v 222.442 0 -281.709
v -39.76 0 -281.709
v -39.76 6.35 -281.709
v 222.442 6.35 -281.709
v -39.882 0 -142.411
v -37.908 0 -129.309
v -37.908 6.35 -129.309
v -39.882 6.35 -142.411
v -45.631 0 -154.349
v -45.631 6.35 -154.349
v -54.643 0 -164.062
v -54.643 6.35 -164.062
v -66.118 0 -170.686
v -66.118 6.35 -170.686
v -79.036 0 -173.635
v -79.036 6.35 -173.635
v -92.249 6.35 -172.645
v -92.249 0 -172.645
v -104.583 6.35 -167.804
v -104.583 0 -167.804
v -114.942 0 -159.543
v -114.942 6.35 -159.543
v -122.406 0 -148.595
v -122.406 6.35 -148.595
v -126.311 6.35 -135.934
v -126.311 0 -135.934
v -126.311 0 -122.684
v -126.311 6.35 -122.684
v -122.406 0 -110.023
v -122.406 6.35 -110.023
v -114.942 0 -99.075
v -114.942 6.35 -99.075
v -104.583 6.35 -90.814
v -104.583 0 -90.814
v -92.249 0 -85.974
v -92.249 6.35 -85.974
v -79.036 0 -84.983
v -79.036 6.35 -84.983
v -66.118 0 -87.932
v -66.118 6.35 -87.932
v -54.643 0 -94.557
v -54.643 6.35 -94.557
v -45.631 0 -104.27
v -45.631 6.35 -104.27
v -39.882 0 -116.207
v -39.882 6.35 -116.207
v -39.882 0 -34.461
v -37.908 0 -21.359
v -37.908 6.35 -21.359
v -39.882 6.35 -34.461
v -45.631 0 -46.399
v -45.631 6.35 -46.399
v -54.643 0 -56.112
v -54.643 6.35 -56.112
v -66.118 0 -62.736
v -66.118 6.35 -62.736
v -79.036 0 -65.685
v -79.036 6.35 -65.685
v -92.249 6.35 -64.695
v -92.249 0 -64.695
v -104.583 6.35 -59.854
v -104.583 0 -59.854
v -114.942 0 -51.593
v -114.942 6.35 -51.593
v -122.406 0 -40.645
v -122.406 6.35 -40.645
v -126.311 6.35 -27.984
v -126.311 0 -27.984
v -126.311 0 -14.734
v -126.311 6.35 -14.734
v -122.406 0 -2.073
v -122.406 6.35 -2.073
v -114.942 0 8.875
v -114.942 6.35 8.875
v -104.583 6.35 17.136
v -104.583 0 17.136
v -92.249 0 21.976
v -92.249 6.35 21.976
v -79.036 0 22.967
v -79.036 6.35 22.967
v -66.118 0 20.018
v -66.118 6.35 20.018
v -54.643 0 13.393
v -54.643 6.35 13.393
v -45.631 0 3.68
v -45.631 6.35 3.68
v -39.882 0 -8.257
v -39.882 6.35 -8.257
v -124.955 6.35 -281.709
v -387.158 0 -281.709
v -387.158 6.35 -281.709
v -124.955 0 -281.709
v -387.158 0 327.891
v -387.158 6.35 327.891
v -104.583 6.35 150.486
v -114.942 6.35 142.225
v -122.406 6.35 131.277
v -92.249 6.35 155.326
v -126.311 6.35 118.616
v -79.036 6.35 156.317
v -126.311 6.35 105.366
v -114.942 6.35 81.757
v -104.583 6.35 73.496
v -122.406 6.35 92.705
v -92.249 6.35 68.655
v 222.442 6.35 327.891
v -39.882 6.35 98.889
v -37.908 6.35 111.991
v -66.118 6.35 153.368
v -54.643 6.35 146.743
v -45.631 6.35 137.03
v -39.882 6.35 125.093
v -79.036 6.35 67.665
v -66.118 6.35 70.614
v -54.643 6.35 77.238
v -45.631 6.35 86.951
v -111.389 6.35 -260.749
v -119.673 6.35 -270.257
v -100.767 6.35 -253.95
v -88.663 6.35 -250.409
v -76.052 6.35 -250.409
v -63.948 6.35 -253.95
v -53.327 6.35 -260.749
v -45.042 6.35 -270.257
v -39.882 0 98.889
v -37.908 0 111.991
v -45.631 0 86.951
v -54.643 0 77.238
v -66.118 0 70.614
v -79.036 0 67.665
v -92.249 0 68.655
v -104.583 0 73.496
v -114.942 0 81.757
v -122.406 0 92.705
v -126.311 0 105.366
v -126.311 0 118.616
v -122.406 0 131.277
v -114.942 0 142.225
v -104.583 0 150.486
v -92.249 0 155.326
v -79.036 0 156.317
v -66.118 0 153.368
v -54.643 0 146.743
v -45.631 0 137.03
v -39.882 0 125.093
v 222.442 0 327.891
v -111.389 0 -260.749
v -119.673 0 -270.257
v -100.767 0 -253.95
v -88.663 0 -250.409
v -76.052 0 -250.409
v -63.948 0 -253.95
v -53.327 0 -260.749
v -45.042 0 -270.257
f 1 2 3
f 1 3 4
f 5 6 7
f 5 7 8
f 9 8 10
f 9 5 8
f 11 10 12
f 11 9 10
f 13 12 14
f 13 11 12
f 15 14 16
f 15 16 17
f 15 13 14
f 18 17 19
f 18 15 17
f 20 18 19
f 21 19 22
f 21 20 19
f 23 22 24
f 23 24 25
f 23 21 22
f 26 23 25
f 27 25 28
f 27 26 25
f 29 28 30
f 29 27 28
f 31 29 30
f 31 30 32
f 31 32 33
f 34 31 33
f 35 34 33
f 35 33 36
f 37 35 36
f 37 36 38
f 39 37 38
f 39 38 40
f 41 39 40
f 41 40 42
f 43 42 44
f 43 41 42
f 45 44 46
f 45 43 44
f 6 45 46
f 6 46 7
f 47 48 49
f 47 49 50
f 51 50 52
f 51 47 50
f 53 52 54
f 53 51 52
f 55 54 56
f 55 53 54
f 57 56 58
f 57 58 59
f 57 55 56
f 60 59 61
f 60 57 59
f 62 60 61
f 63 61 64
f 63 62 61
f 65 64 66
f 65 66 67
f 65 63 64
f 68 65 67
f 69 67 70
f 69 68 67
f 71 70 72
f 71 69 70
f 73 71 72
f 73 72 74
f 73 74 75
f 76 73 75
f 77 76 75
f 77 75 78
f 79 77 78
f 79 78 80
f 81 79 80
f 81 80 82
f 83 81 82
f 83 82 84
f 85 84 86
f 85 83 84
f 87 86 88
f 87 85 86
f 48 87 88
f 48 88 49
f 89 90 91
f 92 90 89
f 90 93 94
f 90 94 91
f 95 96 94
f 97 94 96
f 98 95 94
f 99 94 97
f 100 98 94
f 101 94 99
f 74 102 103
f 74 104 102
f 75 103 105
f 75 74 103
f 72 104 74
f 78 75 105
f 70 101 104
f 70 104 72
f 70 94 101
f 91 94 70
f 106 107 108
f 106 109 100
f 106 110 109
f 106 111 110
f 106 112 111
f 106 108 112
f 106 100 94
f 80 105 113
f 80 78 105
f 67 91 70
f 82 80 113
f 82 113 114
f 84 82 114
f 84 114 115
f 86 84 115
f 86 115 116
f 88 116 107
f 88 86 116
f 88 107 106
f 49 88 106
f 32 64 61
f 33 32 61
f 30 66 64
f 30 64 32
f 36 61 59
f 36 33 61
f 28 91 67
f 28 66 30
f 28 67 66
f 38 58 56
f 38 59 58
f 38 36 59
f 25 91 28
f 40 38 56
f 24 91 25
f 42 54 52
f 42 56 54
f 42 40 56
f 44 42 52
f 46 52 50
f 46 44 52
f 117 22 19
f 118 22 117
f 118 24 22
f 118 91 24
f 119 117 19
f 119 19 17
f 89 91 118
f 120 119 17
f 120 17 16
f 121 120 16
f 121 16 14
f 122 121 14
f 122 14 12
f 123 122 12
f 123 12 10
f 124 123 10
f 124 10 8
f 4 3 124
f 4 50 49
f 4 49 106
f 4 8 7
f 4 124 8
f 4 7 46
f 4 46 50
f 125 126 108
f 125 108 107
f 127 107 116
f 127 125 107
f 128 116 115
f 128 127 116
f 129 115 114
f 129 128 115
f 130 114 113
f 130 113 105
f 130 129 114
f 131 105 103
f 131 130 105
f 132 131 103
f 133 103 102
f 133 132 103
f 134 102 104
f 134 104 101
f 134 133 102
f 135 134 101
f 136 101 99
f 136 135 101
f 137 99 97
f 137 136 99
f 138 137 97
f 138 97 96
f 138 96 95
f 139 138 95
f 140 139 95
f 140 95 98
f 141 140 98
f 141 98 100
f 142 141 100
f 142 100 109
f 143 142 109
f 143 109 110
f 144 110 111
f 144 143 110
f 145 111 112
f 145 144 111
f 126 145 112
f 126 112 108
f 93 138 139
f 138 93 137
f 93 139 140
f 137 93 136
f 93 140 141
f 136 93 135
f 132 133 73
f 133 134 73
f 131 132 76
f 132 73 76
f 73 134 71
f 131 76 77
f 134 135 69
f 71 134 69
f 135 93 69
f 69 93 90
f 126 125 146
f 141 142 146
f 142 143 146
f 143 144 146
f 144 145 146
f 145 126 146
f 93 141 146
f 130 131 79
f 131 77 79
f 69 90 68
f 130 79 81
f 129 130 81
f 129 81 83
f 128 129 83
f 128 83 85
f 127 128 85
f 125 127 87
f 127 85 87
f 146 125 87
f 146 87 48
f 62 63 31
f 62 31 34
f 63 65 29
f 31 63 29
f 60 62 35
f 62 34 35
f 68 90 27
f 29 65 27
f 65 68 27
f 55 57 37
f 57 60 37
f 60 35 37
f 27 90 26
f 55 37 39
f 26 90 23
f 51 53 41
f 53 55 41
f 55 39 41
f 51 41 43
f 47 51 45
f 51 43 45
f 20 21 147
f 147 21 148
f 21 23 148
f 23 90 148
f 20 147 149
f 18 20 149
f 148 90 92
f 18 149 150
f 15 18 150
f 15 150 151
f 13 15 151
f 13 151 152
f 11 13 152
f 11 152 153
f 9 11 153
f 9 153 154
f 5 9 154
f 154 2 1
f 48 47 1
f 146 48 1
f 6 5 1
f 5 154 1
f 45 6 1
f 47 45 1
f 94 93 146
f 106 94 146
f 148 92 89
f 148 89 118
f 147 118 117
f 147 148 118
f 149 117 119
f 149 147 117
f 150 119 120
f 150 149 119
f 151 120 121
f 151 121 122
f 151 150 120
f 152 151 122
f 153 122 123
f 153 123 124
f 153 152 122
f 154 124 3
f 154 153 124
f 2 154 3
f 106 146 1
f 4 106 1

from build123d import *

# Parameters (mm, degrees)
SKETCH1_W              = 609.6
SKETCH1_H              = 609.6
BOSS_EXTRUDE1_DEPTH    = 6.35
CUT_EXTRUDE1_START     = -6.35
CUT_EXTRUDE1_OUTLINE_R = 44.45
CUT_EXTRUDE1_DEPTH     = 6.35


# Read off the part's stored shape, not the designer's step: Cut-Extrude1
with BuildPart() as part:
    # Sketch1 → Boss-Extrude1 (new body)
    with BuildSketch(Plane(origin=(0, 0, 0), x_dir=(1, 0, 0), z_dir=(0, 1, 0))):
        with Locations((-82.357575758, -23.090909091)):
            Rectangle(SKETCH1_W, SKETCH1_H)
    extrude(amount=BOSS_EXTRUDE1_DEPTH)

    # Cut-Extrude1 outline → Cut-Extrude1 (cut)
    with BuildSketch(Plane(origin=(0, 6.35, 0), x_dir=(1, 0, 0), z_dir=(0, 1, 0)).offset(CUT_EXTRUDE1_START)):
        with Locations((-82.357575758, 129.309090909)):
            Circle(CUT_EXTRUDE1_OUTLINE_R)
        with Locations((-82.357575758, 21.359090909)):
            Circle(CUT_EXTRUDE1_OUTLINE_R)
        with Locations((-82.357575758, -111.990909091)):
            Circle(CUT_EXTRUDE1_OUTLINE_R)
        with BuildLine():
            Line((-39.760480786, 281.709090909), (-124.954670729, 281.709090909))
            ThreePointArc((-124.954670729, 281.709090909), (-82.357575758, 249.959090909), (-39.760480786, 281.709090909))
        make_face()
    extrude(amount=CUT_EXTRUDE1_DEPTH, mode=Mode.SUBTRACT)


solid = part.part
